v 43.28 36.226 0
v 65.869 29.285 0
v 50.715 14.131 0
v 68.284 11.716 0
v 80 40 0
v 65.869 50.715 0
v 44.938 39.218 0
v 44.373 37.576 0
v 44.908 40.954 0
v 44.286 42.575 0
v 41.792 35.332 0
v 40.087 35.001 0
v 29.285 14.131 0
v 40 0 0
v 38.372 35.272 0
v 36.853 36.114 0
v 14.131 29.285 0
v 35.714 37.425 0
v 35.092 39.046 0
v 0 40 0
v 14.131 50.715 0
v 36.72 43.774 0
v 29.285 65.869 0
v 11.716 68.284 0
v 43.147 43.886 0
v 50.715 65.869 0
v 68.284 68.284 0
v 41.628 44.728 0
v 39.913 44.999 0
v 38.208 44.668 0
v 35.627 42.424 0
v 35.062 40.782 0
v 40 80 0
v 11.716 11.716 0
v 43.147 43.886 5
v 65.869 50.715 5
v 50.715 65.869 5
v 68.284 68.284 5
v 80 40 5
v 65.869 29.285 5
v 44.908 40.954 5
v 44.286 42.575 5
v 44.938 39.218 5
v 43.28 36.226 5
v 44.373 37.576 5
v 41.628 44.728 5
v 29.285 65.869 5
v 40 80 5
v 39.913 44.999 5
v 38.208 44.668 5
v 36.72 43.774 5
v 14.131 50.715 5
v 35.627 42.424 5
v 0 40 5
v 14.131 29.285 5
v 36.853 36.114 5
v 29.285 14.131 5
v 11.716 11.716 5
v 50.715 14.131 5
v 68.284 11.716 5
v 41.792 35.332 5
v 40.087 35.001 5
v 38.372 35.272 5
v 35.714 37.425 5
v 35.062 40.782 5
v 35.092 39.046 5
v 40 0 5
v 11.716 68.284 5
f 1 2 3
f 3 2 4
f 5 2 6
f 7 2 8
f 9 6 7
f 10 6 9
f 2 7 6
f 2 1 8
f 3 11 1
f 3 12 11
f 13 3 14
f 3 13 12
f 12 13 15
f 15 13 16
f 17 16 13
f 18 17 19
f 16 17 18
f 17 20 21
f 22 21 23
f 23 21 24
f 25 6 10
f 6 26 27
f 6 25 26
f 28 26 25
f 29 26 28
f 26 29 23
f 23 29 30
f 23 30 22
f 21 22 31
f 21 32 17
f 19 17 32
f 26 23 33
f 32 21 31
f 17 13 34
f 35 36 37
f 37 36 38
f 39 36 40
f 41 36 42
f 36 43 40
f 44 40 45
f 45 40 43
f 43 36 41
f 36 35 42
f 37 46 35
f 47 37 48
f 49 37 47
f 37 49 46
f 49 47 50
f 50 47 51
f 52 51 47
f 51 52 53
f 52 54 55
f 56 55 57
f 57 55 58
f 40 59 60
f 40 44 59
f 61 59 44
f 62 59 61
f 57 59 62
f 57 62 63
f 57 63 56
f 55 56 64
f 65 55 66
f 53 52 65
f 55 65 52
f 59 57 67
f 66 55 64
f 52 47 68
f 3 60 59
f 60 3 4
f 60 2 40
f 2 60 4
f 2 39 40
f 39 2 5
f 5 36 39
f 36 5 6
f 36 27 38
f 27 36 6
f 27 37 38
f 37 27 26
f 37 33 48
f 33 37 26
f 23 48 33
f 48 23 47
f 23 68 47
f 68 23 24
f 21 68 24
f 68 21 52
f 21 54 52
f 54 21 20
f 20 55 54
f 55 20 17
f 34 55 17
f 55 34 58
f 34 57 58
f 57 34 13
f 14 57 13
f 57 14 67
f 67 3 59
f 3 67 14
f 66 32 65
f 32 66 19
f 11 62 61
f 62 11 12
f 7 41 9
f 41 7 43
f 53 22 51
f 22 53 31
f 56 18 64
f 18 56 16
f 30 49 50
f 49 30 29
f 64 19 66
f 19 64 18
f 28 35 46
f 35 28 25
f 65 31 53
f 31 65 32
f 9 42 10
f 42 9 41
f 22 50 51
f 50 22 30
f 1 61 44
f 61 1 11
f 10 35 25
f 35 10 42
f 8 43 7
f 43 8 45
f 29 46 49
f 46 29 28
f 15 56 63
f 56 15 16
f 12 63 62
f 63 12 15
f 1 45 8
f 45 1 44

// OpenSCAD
$fn = 32;

// ----------------------------------------------------------------------
// Star wheel: 8-point blunt, R40
// ----------------------------------------------------------------------

// --- parameters (mm) ---
n_points = 8;             // number of points / teeth
r_out = 40;               // tip radius
r_in = 28;                // root radius
bore_r = 5;               // centre bore radius
plate_t = 5;              // plate thickness, Z (extrusion height)
bore_d = 10;              // centre bore diameter

profile = [[0, 40], [14.131, 29.285], [11.716, 11.716], [29.285, 14.131], [40, 0], [50.715, 14.131], [68.284, 11.716], [65.869, 29.285], [80, 40], [65.869, 50.715], [68.284, 68.284], [50.715, 65.869], [40, 80], [29.285, 65.869], [11.716, 68.284], [14.131, 50.715]];  // primary outline, 16 points, counter clockwise
void_1 = [[44.908, 40.954], [44.286, 42.575], [43.147, 43.886], [41.628, 44.728], [39.913, 44.999], [38.208, 44.668], [36.72, 43.774], [35.627, 42.424], [35.062, 40.782], [35.092, 39.046], [35.714, 37.425], [36.853, 36.114], [38.372, 35.272], [40.087, 35.001], [41.792, 35.332], [43.28, 36.226], [44.373, 37.576], [44.938, 39.218]];  // centre bore, 18 points

// --- the one profile operation ---
difference() {
  linear_extrude(height = plate_t) polygon(points = profile);
  translate([0, 0, -1])
    linear_extrude(height = plate_t + 2) polygon(points = void_1);
}
